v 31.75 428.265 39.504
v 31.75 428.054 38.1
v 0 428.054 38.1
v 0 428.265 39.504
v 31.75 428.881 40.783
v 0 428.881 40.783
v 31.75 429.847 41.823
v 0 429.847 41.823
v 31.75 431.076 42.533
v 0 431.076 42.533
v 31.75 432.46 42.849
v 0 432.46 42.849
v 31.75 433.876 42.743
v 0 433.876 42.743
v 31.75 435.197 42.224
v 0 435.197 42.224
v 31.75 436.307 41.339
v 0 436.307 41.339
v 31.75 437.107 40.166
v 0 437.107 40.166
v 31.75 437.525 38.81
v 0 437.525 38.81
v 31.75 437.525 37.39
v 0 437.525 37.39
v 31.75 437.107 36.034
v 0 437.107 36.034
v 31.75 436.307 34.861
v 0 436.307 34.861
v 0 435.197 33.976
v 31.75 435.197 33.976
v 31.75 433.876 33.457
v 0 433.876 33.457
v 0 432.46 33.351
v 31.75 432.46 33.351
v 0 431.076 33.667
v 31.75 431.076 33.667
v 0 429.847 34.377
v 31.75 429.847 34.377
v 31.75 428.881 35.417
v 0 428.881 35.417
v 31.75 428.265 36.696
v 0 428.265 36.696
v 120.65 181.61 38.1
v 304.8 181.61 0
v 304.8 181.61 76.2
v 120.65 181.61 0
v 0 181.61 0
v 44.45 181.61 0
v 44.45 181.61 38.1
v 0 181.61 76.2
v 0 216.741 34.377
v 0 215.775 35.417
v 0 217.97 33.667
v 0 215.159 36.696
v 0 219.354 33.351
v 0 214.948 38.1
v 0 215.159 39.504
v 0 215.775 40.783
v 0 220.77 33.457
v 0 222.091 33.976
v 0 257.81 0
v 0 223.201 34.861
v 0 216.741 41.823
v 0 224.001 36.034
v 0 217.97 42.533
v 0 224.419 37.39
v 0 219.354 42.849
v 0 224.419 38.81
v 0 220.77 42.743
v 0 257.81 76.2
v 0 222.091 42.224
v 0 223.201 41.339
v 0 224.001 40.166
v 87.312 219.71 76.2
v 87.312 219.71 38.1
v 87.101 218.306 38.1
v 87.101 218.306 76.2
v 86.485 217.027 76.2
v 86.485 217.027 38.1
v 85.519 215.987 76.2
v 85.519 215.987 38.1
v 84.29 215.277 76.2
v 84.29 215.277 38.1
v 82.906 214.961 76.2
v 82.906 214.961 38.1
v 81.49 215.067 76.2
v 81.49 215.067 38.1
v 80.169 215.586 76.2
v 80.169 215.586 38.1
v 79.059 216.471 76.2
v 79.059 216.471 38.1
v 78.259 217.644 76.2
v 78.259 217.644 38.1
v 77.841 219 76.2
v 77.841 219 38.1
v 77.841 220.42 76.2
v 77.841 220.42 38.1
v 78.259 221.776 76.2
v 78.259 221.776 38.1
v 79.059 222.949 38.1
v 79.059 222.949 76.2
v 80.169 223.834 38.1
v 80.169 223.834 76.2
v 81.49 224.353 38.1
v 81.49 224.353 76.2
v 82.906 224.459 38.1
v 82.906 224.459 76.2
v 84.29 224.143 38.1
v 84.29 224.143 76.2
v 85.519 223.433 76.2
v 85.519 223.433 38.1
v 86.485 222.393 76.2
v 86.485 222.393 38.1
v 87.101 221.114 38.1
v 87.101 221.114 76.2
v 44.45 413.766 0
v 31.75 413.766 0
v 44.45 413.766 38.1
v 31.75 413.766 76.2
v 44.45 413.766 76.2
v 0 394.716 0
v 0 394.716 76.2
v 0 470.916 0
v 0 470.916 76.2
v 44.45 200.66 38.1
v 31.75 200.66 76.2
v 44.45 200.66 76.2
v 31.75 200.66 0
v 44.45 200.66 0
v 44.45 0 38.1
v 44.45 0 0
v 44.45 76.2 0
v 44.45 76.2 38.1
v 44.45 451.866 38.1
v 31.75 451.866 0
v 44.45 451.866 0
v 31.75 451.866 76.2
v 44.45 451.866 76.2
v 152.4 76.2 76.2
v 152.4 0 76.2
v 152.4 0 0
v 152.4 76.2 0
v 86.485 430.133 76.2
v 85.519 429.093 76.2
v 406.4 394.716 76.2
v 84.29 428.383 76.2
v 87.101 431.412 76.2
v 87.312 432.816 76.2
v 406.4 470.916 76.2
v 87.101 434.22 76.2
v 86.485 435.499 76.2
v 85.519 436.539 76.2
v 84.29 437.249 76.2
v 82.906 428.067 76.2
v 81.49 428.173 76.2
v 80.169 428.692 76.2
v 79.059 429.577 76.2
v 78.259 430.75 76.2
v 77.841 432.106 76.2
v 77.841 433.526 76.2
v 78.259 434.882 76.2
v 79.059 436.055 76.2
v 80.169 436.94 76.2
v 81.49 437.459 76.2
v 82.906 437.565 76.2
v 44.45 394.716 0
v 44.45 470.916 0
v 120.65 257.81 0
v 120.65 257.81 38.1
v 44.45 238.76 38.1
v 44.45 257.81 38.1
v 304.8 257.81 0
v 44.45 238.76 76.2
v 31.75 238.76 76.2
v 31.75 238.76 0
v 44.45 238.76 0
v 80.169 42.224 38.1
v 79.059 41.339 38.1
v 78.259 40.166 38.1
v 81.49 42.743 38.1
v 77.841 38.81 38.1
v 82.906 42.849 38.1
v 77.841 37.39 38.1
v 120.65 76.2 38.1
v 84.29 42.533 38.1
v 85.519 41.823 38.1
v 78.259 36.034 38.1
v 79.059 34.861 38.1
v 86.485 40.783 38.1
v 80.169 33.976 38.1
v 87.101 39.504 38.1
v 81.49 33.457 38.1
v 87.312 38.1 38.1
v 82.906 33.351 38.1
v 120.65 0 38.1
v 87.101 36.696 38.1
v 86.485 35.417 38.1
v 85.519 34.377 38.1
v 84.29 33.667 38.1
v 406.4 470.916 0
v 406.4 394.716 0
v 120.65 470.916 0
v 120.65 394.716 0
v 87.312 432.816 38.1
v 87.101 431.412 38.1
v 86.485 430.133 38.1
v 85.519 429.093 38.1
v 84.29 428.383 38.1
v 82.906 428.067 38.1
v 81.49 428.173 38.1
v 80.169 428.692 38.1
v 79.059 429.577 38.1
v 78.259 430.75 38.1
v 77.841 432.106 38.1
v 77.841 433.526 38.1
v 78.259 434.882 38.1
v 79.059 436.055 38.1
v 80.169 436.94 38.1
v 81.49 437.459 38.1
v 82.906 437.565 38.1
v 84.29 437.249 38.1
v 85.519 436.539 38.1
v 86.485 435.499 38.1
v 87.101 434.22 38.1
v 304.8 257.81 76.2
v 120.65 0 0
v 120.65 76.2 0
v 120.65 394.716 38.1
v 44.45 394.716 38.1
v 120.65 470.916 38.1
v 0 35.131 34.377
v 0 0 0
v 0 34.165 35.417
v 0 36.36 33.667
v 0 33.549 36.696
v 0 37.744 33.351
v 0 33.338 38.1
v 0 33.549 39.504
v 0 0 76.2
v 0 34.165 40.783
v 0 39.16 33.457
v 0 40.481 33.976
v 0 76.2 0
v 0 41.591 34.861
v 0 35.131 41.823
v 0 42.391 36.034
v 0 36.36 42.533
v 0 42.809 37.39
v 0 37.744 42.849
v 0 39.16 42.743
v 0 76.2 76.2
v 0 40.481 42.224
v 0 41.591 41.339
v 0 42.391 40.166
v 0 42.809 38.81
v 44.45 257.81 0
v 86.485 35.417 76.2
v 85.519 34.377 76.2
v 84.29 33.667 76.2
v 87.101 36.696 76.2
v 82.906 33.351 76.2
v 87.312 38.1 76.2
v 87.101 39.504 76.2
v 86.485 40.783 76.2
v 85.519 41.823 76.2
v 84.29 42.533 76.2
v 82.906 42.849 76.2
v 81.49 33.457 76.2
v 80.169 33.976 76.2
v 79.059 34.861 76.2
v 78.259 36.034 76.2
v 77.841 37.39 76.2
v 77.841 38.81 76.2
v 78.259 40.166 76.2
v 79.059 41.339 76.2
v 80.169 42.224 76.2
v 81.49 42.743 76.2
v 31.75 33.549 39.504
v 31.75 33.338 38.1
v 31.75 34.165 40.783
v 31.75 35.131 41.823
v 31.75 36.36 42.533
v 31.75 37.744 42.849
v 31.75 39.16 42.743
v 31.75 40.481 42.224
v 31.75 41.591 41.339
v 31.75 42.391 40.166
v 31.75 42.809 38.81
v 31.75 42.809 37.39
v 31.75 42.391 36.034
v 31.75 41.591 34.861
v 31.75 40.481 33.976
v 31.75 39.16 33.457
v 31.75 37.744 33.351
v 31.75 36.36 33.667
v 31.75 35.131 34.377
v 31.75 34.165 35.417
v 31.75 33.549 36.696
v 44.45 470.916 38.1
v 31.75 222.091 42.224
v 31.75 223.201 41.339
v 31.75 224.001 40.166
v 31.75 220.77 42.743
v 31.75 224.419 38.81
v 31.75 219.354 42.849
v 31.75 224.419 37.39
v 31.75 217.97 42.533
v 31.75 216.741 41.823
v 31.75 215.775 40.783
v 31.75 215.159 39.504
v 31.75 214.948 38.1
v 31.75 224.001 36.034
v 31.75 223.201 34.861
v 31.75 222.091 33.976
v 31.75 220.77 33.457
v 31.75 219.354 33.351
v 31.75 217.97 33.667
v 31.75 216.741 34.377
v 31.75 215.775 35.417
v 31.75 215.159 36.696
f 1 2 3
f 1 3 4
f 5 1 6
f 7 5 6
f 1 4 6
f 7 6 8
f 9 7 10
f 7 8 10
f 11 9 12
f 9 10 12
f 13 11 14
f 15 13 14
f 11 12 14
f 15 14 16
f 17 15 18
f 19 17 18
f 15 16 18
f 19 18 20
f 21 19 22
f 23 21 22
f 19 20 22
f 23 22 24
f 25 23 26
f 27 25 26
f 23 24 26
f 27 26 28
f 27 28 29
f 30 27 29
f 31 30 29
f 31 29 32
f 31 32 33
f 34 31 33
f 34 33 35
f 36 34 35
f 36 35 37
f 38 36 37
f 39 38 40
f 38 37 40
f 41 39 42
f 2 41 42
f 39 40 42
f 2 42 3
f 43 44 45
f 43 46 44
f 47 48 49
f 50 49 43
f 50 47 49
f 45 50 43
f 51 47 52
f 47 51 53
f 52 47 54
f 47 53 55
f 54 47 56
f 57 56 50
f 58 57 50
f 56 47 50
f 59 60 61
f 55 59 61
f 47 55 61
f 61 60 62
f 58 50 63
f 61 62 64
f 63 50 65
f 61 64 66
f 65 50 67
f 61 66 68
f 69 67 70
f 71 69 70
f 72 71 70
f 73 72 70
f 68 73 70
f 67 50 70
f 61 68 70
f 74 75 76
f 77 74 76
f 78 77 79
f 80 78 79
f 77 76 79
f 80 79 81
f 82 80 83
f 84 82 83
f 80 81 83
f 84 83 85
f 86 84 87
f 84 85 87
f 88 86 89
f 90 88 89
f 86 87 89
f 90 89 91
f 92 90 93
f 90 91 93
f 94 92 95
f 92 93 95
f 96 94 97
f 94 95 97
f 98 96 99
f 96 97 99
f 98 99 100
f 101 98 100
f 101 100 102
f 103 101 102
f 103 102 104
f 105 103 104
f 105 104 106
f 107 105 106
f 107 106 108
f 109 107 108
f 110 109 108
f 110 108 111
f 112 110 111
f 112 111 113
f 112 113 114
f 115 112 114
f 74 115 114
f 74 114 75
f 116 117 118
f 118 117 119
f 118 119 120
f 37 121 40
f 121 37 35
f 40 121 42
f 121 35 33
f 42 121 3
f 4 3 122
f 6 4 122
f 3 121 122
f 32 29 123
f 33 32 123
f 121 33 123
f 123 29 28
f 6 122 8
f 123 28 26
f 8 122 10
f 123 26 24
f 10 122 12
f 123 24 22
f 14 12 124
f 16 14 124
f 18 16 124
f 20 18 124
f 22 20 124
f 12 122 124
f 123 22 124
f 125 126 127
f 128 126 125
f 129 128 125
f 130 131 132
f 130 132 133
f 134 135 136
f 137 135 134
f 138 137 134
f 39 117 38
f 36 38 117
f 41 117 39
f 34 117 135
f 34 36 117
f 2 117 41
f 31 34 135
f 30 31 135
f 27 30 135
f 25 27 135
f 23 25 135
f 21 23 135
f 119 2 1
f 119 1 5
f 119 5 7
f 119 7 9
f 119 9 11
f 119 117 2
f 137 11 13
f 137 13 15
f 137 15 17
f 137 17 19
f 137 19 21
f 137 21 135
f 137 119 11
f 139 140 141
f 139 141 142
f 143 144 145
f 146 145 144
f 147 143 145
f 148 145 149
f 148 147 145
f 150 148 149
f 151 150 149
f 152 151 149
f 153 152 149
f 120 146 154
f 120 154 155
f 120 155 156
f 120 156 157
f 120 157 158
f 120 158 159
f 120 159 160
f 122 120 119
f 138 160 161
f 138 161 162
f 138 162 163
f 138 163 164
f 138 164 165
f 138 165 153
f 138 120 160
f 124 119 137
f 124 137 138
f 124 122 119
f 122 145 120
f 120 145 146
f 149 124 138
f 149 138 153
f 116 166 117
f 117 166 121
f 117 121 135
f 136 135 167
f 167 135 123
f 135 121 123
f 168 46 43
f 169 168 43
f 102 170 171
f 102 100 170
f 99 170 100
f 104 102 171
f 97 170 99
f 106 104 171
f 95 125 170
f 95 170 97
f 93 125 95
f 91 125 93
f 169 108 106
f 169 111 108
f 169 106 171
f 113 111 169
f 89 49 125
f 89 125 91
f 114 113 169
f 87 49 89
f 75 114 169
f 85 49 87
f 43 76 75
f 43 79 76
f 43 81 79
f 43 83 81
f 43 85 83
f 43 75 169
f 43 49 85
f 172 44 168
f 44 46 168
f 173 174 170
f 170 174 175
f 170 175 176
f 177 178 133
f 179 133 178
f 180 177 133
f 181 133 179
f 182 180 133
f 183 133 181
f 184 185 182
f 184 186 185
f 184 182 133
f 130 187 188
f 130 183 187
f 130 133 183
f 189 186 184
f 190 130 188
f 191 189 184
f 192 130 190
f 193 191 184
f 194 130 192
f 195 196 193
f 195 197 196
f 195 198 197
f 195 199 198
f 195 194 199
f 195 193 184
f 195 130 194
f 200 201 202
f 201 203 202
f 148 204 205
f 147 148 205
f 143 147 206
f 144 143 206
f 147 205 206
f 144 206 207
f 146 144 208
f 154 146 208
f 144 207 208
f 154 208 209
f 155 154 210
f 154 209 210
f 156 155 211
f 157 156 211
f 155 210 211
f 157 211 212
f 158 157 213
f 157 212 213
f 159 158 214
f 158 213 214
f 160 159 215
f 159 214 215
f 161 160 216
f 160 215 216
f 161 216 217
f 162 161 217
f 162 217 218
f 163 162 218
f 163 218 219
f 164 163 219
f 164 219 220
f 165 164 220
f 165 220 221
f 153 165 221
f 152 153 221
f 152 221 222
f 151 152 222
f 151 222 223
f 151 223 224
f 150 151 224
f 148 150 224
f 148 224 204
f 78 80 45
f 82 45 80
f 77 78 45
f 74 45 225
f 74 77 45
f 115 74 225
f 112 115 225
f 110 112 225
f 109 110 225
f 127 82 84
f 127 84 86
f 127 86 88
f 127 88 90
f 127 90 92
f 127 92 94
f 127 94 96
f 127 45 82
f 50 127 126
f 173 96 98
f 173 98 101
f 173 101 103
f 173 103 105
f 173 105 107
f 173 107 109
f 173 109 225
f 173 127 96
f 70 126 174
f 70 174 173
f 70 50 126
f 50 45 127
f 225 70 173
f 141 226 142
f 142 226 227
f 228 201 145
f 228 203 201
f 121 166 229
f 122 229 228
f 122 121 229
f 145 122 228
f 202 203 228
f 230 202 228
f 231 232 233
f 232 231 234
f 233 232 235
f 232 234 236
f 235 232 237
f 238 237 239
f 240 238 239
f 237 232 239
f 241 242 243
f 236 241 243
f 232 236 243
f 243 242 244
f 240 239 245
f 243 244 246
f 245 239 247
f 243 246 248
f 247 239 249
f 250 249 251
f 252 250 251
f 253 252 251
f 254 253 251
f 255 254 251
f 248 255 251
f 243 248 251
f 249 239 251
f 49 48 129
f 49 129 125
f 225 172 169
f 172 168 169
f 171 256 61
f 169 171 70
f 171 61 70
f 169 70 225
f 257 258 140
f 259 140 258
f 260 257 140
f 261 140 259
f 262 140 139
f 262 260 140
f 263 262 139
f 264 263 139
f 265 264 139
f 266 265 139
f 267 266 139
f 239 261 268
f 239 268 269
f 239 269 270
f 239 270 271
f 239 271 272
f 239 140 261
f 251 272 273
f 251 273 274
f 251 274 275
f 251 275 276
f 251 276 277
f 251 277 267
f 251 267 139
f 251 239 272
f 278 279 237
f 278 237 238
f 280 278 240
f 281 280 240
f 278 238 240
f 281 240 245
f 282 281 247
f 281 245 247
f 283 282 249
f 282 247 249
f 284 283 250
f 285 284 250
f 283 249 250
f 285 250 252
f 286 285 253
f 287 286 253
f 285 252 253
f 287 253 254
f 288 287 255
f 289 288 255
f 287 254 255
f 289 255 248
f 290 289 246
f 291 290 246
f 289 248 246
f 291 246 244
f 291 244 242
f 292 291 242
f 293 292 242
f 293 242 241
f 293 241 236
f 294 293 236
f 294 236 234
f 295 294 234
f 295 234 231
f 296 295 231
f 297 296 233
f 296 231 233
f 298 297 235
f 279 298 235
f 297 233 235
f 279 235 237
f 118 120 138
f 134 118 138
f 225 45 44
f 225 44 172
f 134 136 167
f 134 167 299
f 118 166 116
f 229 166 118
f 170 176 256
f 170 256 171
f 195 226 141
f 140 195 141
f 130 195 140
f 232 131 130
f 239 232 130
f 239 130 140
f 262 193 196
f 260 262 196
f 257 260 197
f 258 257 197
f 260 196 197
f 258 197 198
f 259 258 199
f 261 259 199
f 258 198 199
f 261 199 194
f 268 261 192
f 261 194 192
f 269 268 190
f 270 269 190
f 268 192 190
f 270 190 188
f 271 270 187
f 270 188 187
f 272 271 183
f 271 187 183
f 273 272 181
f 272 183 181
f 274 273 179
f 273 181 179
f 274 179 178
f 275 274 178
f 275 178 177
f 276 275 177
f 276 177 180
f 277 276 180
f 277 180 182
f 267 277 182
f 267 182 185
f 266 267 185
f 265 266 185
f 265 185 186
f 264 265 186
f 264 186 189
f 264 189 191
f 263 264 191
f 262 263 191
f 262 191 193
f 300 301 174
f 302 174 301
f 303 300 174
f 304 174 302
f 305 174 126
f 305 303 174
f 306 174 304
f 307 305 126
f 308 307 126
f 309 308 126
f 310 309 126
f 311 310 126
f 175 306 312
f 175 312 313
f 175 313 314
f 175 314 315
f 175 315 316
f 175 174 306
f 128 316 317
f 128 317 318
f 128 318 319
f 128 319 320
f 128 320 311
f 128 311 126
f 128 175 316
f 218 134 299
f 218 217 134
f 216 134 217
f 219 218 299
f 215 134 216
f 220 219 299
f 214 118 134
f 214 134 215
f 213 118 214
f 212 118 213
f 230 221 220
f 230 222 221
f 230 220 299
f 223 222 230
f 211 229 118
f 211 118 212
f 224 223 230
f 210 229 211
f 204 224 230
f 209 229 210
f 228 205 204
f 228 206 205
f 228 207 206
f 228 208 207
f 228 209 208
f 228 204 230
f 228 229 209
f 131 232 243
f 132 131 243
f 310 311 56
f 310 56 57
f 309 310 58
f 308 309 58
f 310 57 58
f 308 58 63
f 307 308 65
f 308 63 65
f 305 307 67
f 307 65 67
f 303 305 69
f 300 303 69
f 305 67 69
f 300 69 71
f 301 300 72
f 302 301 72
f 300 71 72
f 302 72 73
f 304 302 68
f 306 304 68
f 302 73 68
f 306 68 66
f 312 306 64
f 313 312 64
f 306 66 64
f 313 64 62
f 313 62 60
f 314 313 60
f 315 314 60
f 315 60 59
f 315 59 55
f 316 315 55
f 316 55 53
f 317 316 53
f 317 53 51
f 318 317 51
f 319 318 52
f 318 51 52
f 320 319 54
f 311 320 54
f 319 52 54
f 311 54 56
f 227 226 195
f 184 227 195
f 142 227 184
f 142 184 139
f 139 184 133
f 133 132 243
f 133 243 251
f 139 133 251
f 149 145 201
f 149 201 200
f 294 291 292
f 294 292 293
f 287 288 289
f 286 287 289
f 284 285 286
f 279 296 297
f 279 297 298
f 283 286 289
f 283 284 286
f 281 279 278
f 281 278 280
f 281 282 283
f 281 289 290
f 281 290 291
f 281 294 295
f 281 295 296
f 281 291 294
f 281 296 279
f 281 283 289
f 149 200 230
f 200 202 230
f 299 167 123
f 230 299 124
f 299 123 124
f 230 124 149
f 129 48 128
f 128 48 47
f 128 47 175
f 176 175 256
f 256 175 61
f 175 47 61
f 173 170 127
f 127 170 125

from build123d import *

# Parameters (mm, degrees)
F0_W      = 76.2
F0_H      = 76.2
F1_DEPTH  = 152.4
F2_W      = 76.2
F2_H      = 38.1
F3_DEPTH  = 76.2
F4_R      = 4.7625
F5_DEPTH  = 31.75
F6_R      = 4.7625
F7_DEPTH  = 38.101
F9_DEPTH  = 152.4
F10_W     = 12.7
F10_H     = 38.1
F11_DEPTH = 76.201
F13_DEPTH = 254
F14_W     = 12.7
F14_H     = 38.1
F15_DEPTH = 76.201


with BuildPart() as f1:
    # F0 (on Right) → F1 (new body)
    with BuildSketch(Plane.YZ):
        with Locations((38.1, 38.1)):
            Rectangle(F0_W, F0_H)
    extrude(amount=F1_DEPTH)

    # F2 (on face) → F3 (cut)
    with BuildSketch(Plane.XZ):
        with Locations((82.55, 19.05)):
            Rectangle(F2_W, F2_H)
    extrude(amount=-F3_DEPTH, mode=Mode.SUBTRACT)

    # F4 (on face) → F5 (cut)
    with BuildSketch(Plane(origin=(0, 0, 0), x_dir=(0, -1, 0), z_dir=(-1, 0, 0))):
        with Locations((-38.1, 38.1)):
            Circle(F4_R)
    extrude(amount=-F5_DEPTH, mode=Mode.SUBTRACT)

    # F6 (on face) → F7 (cut, through all)
    with BuildSketch(Plane(origin=(0, 0, 38.1), x_dir=(1, 0, 0), z_dir=(0, 0, -1))):
        with Locations((82.55, -38.1)):
            Circle(F6_R)
    extrude(amount=-F7_DEPTH, mode=Mode.SUBTRACT)


with BuildPart() as f8_1:
    # F8: copy of F1
    add(f1.part.moved(Location((0, 181.61, 0))))

    # F9 (add): a face of the model
    f9_faces = [f8_1.faces().sort_by_distance(p)[0] for p in [
        (152.4, 219.71, 38.1),
    ]]
    extrude(f9_faces, amount=F9_DEPTH)

    # F10 (on face) → F11 (cut, through all)
    with BuildSketch(Plane(origin=(0, 0, 0), x_dir=(1, 0, 0), z_dir=(0, 0, -1))):
        with Locations((38.1, -219.71)):
            Rectangle(F10_W, F10_H)
    extrude(amount=-F11_DEPTH, mode=Mode.SUBTRACT)


with BuildPart() as f12_1:
    # F12: copy of F1
    add(f1.part.moved(Location((0, 394.716, 0))))

    # F13 (add): a face of the model
    f13_faces = [f12_1.faces().sort_by_distance(p)[0] for p in [
        (152.4, 432.816, 38.1),
    ]]
    extrude(f13_faces, amount=F13_DEPTH)

    # F14 (on face) → F15 (cut, through all)
    with BuildSketch(Plane.XY.offset(76.2)):
        with Locations((38.1, 432.816)):
            Rectangle(F14_W, F14_H)
    extrude(amount=-F15_DEPTH, mode=Mode.SUBTRACT)


solid = Compound([f1.part, f8_1.part, f12_1.part])
